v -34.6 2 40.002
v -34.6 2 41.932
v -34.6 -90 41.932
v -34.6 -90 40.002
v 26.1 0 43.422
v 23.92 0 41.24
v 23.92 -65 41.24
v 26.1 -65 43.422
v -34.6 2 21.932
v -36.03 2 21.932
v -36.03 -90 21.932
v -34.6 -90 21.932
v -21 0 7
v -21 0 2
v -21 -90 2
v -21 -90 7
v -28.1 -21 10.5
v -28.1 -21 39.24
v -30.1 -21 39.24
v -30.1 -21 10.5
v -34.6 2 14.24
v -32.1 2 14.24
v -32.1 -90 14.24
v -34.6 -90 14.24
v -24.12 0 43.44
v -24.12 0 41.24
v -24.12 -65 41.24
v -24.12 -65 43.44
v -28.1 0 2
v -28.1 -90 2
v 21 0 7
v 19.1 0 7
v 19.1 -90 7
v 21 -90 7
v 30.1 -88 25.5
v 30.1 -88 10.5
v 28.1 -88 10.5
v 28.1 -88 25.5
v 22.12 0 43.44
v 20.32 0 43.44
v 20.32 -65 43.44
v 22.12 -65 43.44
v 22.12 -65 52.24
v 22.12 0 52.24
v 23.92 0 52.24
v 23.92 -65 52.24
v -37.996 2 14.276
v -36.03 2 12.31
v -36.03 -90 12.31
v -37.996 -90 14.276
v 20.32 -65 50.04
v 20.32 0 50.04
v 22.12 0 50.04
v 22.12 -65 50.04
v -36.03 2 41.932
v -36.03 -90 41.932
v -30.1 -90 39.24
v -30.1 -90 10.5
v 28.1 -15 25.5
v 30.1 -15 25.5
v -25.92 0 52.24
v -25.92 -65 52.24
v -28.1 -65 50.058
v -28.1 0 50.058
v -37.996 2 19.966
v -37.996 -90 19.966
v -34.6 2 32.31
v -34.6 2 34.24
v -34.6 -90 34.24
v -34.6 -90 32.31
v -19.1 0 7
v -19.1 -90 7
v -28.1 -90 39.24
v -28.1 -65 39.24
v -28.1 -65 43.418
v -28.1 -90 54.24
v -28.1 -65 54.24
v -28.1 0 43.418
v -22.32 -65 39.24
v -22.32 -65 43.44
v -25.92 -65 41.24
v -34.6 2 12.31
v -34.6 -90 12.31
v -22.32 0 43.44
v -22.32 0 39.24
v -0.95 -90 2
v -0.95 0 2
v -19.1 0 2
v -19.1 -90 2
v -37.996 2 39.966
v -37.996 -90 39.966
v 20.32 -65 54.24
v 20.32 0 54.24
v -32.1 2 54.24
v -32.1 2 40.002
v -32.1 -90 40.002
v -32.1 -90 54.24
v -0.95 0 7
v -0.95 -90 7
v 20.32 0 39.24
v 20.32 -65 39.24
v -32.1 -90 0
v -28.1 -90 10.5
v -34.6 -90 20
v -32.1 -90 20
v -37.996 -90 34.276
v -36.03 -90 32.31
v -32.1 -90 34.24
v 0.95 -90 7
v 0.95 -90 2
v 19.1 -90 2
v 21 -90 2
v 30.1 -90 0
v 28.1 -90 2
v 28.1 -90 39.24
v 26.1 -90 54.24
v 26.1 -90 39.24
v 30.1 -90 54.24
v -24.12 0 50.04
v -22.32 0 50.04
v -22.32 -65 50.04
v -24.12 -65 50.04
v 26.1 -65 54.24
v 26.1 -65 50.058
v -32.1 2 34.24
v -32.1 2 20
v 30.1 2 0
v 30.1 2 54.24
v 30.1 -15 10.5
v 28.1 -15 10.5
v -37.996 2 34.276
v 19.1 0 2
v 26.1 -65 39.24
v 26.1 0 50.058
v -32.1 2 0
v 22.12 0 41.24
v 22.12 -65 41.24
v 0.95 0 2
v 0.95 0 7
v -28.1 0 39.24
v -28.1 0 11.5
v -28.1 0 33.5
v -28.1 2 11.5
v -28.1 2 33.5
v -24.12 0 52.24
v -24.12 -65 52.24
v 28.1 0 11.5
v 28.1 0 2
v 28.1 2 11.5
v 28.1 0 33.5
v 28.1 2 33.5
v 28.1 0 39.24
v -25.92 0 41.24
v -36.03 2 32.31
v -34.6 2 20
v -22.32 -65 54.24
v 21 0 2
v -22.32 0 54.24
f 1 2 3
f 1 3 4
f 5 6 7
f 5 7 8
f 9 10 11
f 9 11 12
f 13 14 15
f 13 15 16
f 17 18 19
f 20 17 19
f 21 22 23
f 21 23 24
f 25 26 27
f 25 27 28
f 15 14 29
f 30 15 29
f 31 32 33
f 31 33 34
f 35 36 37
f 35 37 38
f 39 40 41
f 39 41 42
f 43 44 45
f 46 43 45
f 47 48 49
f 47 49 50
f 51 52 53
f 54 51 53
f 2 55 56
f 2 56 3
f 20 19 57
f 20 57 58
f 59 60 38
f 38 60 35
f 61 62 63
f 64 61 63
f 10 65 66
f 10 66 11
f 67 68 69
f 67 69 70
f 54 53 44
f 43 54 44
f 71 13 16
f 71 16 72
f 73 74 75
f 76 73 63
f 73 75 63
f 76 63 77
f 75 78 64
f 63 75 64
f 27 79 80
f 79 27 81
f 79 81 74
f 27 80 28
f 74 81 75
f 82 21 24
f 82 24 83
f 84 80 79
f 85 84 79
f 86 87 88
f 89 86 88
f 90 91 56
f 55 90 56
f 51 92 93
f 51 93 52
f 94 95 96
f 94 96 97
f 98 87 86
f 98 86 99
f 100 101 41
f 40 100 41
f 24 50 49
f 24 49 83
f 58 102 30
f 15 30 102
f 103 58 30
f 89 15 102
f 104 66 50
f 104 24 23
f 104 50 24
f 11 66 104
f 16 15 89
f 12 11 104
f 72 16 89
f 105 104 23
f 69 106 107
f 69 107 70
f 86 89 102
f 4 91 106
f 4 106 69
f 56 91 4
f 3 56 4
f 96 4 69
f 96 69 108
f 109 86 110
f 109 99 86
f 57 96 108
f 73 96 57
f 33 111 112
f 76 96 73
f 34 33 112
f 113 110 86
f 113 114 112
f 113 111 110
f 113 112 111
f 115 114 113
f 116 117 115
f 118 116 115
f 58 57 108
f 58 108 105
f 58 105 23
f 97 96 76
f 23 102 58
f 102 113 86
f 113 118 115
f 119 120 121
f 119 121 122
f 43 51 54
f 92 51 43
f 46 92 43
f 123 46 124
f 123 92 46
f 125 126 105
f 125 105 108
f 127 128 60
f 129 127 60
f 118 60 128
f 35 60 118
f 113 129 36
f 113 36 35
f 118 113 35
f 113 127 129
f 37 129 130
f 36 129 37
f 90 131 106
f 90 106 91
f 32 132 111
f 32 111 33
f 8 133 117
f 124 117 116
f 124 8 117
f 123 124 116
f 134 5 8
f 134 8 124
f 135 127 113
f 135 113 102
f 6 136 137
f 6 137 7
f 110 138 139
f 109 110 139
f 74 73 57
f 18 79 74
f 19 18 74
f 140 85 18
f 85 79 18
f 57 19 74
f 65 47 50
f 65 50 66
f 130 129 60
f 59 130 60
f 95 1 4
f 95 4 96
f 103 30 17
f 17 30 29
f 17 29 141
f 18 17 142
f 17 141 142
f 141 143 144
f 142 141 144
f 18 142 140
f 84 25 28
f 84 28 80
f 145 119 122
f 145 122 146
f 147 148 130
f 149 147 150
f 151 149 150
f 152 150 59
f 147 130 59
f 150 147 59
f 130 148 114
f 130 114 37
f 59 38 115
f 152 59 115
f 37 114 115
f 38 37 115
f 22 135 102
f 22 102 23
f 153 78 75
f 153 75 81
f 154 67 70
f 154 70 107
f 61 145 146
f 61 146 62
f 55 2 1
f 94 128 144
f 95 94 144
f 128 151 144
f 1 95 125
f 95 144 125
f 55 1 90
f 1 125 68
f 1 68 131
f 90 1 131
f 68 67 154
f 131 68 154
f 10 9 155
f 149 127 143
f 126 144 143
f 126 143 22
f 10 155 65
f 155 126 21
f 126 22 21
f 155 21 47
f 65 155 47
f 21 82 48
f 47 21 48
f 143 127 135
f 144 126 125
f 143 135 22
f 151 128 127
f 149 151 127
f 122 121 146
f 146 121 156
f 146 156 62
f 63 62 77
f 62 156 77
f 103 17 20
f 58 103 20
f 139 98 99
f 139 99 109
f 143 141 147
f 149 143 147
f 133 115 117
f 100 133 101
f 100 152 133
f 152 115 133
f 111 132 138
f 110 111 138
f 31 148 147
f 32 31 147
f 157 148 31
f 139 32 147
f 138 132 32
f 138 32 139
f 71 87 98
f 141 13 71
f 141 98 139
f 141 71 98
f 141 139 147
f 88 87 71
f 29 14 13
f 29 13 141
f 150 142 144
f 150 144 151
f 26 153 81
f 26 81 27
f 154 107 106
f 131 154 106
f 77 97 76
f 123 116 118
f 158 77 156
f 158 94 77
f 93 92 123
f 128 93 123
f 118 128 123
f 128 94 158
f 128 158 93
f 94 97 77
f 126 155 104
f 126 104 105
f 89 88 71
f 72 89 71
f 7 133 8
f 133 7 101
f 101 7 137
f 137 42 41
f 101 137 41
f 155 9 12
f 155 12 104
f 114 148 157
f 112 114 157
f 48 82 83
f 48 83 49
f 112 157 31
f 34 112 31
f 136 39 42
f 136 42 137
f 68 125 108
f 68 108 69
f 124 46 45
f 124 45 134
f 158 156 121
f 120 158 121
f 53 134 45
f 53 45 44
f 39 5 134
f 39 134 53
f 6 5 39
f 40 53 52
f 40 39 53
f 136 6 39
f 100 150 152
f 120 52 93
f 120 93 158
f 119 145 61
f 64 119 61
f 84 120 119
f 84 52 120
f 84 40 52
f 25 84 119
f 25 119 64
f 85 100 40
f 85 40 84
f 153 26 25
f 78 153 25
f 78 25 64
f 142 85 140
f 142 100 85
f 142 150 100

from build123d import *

# Parameters (mm, degrees)
SKETCH_W        = 1.9
SKETCH_H        = 5
PAD_DEPTH       = 90
SKETCH001_W     = 2
SKETCH001_H     = 69
SKETCH001_H_2   = 73
POCKET_DEPTH    = 5
SKETCH002_W     = 60.2
SKETCH002_H     = 11.5
PAD001_DEPTH    = 2
SKETCH004_W     = 2
SKETCH004_H     = 2
PAD002_DEPTH    = 4
PAD003_DEPTH    = 92
SKETCH006_W     = 2
SKETCH006_H     = 73
PAD004_DEPTH    = 5
SKETCH007_W     = 2
SKETCH007_H     = 92
PAD005_DEPTH    = 38.74
SKETCH008_W     = 15
SKETCH008_H     = 73
POCKET001_DEPTH = 2
SKETCH009_W     = 2
SKETCH009_H     = 23
PAD006_DEPTH    = 38.74
SKETCH010_W     = 56.2
SKETCH010_H     = 2
PAD007_DEPTH    = 42.74
SKETCH011_W     = 56.2
SKETCH011_H     = 22
POCKET002_DEPTH = 2
SKETCH012_W     = 2
SKETCH012_H     = 15
PAD008_DEPTH    = 69
SKETCH013_W     = 2
SKETCH013_H     = 15
PAD009_DEPTH    = 90
PAD010_DEPTH    = 65


with BuildPart() as part:
    # Sketch → Pad (new body)
    with BuildSketch(Plane.XZ):
        Polygon((-30.1, 0), (30.1, 0), (30.1, 15.5), (28.1, 15.5), (28.1, 2), (-28.1, 2), (-28.1, 15.5), (-30.1, 15.5), align=None)
        with Locations((0, 4.5)):
            Rectangle(SKETCH_W, SKETCH_H)
        with Locations((-20.05, 4.5)):
            Rectangle(SKETCH_W, SKETCH_H)
        with Locations((20.05, 4.5)):
            Rectangle(SKETCH_W, SKETCH_H)
    extrude(amount=PAD_DEPTH)

    # Sketch001 (on Face3 of Pad) → Pocket (cut)
    with BuildSketch(Plane(origin=(0, 0, 15.5), x_dir=(-1, 0, 0), z_dir=(0, 0, 1))):
        with Locations((29.1, 55.5)):
            Rectangle(SKETCH001_W, SKETCH001_H)
        with Locations((-29.1, 53.5)):
            Rectangle(SKETCH001_W, SKETCH001_H_2)
    extrude(amount=-POCKET_DEPTH, mode=Mode.SUBTRACT)

    # Sketch002 (on Face2 of Pocket) → Pad001 (join)
    with BuildSketch(Plane(origin=(0, 0, 0), x_dir=(1, 0, 0), z_dir=(0, 1, 0))):
        with Locations((0, -5.75)):
            Rectangle(SKETCH002_W, SKETCH002_H)
    extrude(amount=PAD001_DEPTH)

    # Sketch004 → Pad002 (join)
    with BuildSketch(Plane(origin=(0, 0, 11.5), x_dir=(-1, 0, 0), z_dir=(0, 0, 1))):
        with Locations((-29.1, -1)):
            Rectangle(SKETCH004_W, SKETCH004_H)
        with Locations((29.1, -1)):
            Rectangle(SKETCH004_W, SKETCH004_H)
    extrude(amount=PAD002_DEPTH)

    # Sketch005 (on Face26 of Pad002) → Pad003 (join)
    with BuildSketch(Plane(origin=(0, 2, 0), x_dir=(1, 0, 0), z_dir=(0, 1, 0))):
        Polygon((-30.1, -54.24), (-30.1, 0), (-32.1, 0), (-32.1, -14.24), (-34.6, -14.24), (-34.6, -12.31), (-36.03, -12.31), (-37.995757, -14.275757), (-37.995757, -19.965757), (-36.03, -21.931514), (-34.6, -21.931514), (-34.6, -20), (-32.1, -20), (-32.1, -34.24), (-34.6, -34.24), (-34.6, -32.31), (-36.03, -32.31), (-37.995757, -34.275757), (-37.995757, -39.965757), (-36.03, -41.931514), (-34.6, -41.931514), (-34.6, -40.001514), (-32.1, -40.001514), (-32.1, -54.24), align=None)
    extrude(amount=-PAD003_DEPTH)

    # Sketch006 (on Face46 of Pad003) → Pad004 (join)
    with BuildSketch(Plane(origin=(0, 0, 10.5), x_dir=(-1, 0, 0), z_dir=(0, 0, 1))):
        with Locations((-29.1, 53.5)):
            Rectangle(SKETCH006_W, SKETCH006_H)
    extrude(amount=PAD004_DEPTH)

    # Sketch007 (on Face48 of Pad004) → Pad005 (join)
    with BuildSketch(Plane(origin=(0, 0, 15.5), x_dir=(-1, 0, 0), z_dir=(0, 0, 1))):
        with Locations((-29.1, 44)):
            Rectangle(SKETCH007_W, SKETCH007_H)
    extrude(amount=PAD005_DEPTH)

    # Sketch008 (on Face48 of Pad005) → Pocket001 (cut)
    with BuildSketch(Plane(origin=(30.1, 0, 0), x_dir=(0, 0, 1), z_dir=(1, 0, 0))):
        with Locations((18, 51.5)):
            Rectangle(SKETCH008_W, SKETCH008_H)
    extrude(amount=-POCKET001_DEPTH, mode=Mode.SUBTRACT)

    # Sketch009 (on Face51 of Pocket001) → Pad006 (join)
    with BuildSketch(Plane(origin=(0, 0, 15.5), x_dir=(-1, 0, 0), z_dir=(0, 0, 1))):
        with Locations((29.1, 9.5)):
            Rectangle(SKETCH009_W, SKETCH009_H)
    extrude(amount=PAD006_DEPTH)

    # Sketch010 (on Face17 of Pad006) → Pad007 (join)
    with BuildSketch(Plane(origin=(0, 0, 11.5), x_dir=(-1, 0, 0), z_dir=(0, 0, 1))):
        with Locations((0, -1)):
            Rectangle(SKETCH010_W, SKETCH010_H)
    extrude(amount=PAD007_DEPTH)

    # Sketch011 (on Face47 of Pad007) → Pocket002 (cut)
    with BuildSketch(Plane.XZ):
        with Locations((0, 22.5)):
            Rectangle(SKETCH011_W, SKETCH011_H)
    extrude(amount=-POCKET002_DEPTH, mode=Mode.SUBTRACT)

    # Sketch012 (on Face49 of Pocket002) → Pad008 (join)
    with BuildSketch(Plane.XZ.offset(21)):
        with Locations((-29.1, 46.74)):
            Rectangle(SKETCH012_W, SKETCH012_H)
    extrude(amount=PAD008_DEPTH)

    # Sketch013 (on Face22 of Pad008) → Pad009 (join)
    with BuildSketch(Plane.XZ):
        with Locations((27.1, 46.74)):
            Rectangle(SKETCH013_W, SKETCH013_H)
    extrude(amount=PAD009_DEPTH)

    # Sketch014 (on Face44 of Pad009) → Pad010 (join)
    with BuildSketch(Plane.XZ):
        Polygon((20.32, 39.24), (20.32, 43.44), (22.12, 43.44), (22.12, 41.24), (23.92, 41.24), (26.118204, 43.44), (26.118204, 39.24), align=None)
        Polygon((20.32, 54.24), (20.32, 50.04), (22.12, 50.04), (22.12, 52.24), (23.92, 52.24), (26.118204, 50.04), (26.118204, 54.24), align=None)
        Polygon((-22.32, 43.44), (-22.32, 39.24), (-28.12, 39.24), (-28.12, 43.438204), (-25.92, 41.24), (-24.12, 41.24), (-24.12, 43.44), align=None)
        Polygon((-22.32, 54.24), (-22.32, 50.04), (-24.12, 50.04), (-24.12, 52.24), (-25.92, 52.24), (-28.118204, 50.04), (-28.118204, 54.24), align=None)
    extrude(amount=PAD010_DEPTH)


solid = part.part
